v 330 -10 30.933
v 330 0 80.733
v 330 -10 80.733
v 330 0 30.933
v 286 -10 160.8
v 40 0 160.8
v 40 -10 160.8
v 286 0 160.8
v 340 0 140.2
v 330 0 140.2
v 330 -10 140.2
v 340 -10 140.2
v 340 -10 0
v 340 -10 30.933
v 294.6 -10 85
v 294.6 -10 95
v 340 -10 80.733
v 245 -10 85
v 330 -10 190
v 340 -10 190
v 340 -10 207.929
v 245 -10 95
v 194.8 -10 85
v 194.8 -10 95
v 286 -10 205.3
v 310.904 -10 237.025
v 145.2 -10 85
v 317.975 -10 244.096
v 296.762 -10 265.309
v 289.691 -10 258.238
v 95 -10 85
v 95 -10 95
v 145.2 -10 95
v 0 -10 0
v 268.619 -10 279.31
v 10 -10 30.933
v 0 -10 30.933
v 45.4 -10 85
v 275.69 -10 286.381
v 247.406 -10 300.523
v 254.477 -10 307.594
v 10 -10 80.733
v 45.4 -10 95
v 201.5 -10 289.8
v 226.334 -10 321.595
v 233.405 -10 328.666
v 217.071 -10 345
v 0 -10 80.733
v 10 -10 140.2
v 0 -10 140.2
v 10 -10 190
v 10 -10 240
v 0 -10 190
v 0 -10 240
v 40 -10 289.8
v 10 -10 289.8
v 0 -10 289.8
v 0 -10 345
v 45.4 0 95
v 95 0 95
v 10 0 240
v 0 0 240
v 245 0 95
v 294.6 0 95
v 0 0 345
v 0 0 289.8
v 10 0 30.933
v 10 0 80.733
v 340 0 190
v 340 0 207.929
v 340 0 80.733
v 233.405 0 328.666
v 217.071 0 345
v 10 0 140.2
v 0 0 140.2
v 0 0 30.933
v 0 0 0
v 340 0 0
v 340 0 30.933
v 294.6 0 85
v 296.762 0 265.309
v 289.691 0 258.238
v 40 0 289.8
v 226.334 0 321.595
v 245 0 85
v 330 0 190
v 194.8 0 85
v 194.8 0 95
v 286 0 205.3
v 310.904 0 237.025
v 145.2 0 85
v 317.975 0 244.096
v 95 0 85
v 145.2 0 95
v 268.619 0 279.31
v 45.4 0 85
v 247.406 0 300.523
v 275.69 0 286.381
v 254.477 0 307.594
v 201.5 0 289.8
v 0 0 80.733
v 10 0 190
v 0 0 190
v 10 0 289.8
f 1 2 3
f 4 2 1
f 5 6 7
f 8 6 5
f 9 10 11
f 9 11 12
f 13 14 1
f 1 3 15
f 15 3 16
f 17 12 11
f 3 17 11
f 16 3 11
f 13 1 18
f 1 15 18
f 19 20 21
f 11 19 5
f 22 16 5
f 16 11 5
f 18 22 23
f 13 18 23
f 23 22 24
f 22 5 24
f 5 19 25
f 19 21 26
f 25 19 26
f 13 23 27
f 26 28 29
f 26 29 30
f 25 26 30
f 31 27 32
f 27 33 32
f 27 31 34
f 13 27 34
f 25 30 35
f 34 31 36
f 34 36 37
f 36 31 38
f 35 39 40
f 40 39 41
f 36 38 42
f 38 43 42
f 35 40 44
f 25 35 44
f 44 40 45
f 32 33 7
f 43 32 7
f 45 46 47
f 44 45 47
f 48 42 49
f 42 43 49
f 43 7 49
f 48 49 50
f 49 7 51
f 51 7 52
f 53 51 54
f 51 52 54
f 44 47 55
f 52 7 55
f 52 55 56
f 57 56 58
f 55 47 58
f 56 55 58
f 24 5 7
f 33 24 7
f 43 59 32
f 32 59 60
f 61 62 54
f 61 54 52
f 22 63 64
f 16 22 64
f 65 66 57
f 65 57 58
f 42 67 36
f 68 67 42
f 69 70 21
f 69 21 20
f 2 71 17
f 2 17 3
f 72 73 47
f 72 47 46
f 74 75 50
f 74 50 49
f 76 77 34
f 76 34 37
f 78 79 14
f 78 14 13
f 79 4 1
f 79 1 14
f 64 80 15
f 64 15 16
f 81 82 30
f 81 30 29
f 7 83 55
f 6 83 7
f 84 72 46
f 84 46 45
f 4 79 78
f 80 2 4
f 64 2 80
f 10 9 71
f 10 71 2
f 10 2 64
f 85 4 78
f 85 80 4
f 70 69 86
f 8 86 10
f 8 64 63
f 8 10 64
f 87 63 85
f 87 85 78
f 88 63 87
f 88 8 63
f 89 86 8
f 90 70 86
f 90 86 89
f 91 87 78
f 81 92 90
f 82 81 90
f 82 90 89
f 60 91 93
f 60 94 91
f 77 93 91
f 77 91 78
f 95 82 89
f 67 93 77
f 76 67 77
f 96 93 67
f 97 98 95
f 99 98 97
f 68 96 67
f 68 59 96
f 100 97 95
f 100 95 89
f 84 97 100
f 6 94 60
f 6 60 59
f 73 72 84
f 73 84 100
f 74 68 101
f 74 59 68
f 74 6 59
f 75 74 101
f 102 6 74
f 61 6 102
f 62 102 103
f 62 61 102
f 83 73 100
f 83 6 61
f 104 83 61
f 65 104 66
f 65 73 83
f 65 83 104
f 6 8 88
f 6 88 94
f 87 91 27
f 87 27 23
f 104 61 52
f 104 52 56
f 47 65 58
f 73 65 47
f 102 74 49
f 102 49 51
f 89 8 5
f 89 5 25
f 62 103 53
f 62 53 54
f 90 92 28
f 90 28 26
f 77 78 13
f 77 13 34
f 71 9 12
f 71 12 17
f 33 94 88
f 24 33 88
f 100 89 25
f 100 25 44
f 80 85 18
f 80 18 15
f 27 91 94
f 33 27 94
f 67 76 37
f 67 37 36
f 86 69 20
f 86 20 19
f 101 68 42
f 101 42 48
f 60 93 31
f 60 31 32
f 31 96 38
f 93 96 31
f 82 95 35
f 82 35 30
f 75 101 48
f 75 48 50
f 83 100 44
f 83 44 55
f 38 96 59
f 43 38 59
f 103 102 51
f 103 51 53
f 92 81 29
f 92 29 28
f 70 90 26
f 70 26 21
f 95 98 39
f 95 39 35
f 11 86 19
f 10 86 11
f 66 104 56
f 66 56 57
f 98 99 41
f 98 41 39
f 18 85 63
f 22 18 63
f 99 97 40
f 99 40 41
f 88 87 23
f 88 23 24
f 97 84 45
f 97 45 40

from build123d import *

# Parameters (mm, degrees)
SKETCH_W  = 49.6
SKETCH_H  = 10
PAD_DEPTH = 10


with BuildPart() as part:
    # Sketch → Pad (new body)
    with BuildSketch(Plane.XZ):
        Polygon((0, 0), (0, 30.933), (10, 30.933), (10, 80.733), (0, 80.733), (0, 140.2), (10, 140.2), (10, 190), (0, 190), (0, 240), (10, 240), (10, 289.8), (0, 289.8), (0, 345), (217.0709, 345), (233.405067, 328.665833), (226.333999, 321.594766), (247.405781, 300.522983), (254.476849, 307.594051), (275.690052, 286.380848), (268.618985, 279.30978), (289.690767, 258.237998), (296.761835, 265.309066), (317.975038, 244.095862), (310.90397, 237.024795), (340, 207.928765), (340, 189.999765), (330, 189.999765), (330, 140.199765), (340, 140.199765), (340, 80.733), (330, 80.733), (330, 30.933), (340, 30.933), (340, 0), align=None)
        with Locations((70.2, 90)):
            Rectangle(SKETCH_W, SKETCH_H, mode=Mode.SUBTRACT)
        with Locations((170, 90)):
            Rectangle(SKETCH_W, SKETCH_H, mode=Mode.SUBTRACT)
        with Locations((269.8, 90)):
            Rectangle(SKETCH_W, SKETCH_H, mode=Mode.SUBTRACT)
        Polygon((40, 289.8), (40, 160.8), (286, 160.8), (286, 205.3), (201.5, 289.8), align=None, mode=Mode.SUBTRACT)
    extrude(amount=PAD_DEPTH)


solid = part.part
